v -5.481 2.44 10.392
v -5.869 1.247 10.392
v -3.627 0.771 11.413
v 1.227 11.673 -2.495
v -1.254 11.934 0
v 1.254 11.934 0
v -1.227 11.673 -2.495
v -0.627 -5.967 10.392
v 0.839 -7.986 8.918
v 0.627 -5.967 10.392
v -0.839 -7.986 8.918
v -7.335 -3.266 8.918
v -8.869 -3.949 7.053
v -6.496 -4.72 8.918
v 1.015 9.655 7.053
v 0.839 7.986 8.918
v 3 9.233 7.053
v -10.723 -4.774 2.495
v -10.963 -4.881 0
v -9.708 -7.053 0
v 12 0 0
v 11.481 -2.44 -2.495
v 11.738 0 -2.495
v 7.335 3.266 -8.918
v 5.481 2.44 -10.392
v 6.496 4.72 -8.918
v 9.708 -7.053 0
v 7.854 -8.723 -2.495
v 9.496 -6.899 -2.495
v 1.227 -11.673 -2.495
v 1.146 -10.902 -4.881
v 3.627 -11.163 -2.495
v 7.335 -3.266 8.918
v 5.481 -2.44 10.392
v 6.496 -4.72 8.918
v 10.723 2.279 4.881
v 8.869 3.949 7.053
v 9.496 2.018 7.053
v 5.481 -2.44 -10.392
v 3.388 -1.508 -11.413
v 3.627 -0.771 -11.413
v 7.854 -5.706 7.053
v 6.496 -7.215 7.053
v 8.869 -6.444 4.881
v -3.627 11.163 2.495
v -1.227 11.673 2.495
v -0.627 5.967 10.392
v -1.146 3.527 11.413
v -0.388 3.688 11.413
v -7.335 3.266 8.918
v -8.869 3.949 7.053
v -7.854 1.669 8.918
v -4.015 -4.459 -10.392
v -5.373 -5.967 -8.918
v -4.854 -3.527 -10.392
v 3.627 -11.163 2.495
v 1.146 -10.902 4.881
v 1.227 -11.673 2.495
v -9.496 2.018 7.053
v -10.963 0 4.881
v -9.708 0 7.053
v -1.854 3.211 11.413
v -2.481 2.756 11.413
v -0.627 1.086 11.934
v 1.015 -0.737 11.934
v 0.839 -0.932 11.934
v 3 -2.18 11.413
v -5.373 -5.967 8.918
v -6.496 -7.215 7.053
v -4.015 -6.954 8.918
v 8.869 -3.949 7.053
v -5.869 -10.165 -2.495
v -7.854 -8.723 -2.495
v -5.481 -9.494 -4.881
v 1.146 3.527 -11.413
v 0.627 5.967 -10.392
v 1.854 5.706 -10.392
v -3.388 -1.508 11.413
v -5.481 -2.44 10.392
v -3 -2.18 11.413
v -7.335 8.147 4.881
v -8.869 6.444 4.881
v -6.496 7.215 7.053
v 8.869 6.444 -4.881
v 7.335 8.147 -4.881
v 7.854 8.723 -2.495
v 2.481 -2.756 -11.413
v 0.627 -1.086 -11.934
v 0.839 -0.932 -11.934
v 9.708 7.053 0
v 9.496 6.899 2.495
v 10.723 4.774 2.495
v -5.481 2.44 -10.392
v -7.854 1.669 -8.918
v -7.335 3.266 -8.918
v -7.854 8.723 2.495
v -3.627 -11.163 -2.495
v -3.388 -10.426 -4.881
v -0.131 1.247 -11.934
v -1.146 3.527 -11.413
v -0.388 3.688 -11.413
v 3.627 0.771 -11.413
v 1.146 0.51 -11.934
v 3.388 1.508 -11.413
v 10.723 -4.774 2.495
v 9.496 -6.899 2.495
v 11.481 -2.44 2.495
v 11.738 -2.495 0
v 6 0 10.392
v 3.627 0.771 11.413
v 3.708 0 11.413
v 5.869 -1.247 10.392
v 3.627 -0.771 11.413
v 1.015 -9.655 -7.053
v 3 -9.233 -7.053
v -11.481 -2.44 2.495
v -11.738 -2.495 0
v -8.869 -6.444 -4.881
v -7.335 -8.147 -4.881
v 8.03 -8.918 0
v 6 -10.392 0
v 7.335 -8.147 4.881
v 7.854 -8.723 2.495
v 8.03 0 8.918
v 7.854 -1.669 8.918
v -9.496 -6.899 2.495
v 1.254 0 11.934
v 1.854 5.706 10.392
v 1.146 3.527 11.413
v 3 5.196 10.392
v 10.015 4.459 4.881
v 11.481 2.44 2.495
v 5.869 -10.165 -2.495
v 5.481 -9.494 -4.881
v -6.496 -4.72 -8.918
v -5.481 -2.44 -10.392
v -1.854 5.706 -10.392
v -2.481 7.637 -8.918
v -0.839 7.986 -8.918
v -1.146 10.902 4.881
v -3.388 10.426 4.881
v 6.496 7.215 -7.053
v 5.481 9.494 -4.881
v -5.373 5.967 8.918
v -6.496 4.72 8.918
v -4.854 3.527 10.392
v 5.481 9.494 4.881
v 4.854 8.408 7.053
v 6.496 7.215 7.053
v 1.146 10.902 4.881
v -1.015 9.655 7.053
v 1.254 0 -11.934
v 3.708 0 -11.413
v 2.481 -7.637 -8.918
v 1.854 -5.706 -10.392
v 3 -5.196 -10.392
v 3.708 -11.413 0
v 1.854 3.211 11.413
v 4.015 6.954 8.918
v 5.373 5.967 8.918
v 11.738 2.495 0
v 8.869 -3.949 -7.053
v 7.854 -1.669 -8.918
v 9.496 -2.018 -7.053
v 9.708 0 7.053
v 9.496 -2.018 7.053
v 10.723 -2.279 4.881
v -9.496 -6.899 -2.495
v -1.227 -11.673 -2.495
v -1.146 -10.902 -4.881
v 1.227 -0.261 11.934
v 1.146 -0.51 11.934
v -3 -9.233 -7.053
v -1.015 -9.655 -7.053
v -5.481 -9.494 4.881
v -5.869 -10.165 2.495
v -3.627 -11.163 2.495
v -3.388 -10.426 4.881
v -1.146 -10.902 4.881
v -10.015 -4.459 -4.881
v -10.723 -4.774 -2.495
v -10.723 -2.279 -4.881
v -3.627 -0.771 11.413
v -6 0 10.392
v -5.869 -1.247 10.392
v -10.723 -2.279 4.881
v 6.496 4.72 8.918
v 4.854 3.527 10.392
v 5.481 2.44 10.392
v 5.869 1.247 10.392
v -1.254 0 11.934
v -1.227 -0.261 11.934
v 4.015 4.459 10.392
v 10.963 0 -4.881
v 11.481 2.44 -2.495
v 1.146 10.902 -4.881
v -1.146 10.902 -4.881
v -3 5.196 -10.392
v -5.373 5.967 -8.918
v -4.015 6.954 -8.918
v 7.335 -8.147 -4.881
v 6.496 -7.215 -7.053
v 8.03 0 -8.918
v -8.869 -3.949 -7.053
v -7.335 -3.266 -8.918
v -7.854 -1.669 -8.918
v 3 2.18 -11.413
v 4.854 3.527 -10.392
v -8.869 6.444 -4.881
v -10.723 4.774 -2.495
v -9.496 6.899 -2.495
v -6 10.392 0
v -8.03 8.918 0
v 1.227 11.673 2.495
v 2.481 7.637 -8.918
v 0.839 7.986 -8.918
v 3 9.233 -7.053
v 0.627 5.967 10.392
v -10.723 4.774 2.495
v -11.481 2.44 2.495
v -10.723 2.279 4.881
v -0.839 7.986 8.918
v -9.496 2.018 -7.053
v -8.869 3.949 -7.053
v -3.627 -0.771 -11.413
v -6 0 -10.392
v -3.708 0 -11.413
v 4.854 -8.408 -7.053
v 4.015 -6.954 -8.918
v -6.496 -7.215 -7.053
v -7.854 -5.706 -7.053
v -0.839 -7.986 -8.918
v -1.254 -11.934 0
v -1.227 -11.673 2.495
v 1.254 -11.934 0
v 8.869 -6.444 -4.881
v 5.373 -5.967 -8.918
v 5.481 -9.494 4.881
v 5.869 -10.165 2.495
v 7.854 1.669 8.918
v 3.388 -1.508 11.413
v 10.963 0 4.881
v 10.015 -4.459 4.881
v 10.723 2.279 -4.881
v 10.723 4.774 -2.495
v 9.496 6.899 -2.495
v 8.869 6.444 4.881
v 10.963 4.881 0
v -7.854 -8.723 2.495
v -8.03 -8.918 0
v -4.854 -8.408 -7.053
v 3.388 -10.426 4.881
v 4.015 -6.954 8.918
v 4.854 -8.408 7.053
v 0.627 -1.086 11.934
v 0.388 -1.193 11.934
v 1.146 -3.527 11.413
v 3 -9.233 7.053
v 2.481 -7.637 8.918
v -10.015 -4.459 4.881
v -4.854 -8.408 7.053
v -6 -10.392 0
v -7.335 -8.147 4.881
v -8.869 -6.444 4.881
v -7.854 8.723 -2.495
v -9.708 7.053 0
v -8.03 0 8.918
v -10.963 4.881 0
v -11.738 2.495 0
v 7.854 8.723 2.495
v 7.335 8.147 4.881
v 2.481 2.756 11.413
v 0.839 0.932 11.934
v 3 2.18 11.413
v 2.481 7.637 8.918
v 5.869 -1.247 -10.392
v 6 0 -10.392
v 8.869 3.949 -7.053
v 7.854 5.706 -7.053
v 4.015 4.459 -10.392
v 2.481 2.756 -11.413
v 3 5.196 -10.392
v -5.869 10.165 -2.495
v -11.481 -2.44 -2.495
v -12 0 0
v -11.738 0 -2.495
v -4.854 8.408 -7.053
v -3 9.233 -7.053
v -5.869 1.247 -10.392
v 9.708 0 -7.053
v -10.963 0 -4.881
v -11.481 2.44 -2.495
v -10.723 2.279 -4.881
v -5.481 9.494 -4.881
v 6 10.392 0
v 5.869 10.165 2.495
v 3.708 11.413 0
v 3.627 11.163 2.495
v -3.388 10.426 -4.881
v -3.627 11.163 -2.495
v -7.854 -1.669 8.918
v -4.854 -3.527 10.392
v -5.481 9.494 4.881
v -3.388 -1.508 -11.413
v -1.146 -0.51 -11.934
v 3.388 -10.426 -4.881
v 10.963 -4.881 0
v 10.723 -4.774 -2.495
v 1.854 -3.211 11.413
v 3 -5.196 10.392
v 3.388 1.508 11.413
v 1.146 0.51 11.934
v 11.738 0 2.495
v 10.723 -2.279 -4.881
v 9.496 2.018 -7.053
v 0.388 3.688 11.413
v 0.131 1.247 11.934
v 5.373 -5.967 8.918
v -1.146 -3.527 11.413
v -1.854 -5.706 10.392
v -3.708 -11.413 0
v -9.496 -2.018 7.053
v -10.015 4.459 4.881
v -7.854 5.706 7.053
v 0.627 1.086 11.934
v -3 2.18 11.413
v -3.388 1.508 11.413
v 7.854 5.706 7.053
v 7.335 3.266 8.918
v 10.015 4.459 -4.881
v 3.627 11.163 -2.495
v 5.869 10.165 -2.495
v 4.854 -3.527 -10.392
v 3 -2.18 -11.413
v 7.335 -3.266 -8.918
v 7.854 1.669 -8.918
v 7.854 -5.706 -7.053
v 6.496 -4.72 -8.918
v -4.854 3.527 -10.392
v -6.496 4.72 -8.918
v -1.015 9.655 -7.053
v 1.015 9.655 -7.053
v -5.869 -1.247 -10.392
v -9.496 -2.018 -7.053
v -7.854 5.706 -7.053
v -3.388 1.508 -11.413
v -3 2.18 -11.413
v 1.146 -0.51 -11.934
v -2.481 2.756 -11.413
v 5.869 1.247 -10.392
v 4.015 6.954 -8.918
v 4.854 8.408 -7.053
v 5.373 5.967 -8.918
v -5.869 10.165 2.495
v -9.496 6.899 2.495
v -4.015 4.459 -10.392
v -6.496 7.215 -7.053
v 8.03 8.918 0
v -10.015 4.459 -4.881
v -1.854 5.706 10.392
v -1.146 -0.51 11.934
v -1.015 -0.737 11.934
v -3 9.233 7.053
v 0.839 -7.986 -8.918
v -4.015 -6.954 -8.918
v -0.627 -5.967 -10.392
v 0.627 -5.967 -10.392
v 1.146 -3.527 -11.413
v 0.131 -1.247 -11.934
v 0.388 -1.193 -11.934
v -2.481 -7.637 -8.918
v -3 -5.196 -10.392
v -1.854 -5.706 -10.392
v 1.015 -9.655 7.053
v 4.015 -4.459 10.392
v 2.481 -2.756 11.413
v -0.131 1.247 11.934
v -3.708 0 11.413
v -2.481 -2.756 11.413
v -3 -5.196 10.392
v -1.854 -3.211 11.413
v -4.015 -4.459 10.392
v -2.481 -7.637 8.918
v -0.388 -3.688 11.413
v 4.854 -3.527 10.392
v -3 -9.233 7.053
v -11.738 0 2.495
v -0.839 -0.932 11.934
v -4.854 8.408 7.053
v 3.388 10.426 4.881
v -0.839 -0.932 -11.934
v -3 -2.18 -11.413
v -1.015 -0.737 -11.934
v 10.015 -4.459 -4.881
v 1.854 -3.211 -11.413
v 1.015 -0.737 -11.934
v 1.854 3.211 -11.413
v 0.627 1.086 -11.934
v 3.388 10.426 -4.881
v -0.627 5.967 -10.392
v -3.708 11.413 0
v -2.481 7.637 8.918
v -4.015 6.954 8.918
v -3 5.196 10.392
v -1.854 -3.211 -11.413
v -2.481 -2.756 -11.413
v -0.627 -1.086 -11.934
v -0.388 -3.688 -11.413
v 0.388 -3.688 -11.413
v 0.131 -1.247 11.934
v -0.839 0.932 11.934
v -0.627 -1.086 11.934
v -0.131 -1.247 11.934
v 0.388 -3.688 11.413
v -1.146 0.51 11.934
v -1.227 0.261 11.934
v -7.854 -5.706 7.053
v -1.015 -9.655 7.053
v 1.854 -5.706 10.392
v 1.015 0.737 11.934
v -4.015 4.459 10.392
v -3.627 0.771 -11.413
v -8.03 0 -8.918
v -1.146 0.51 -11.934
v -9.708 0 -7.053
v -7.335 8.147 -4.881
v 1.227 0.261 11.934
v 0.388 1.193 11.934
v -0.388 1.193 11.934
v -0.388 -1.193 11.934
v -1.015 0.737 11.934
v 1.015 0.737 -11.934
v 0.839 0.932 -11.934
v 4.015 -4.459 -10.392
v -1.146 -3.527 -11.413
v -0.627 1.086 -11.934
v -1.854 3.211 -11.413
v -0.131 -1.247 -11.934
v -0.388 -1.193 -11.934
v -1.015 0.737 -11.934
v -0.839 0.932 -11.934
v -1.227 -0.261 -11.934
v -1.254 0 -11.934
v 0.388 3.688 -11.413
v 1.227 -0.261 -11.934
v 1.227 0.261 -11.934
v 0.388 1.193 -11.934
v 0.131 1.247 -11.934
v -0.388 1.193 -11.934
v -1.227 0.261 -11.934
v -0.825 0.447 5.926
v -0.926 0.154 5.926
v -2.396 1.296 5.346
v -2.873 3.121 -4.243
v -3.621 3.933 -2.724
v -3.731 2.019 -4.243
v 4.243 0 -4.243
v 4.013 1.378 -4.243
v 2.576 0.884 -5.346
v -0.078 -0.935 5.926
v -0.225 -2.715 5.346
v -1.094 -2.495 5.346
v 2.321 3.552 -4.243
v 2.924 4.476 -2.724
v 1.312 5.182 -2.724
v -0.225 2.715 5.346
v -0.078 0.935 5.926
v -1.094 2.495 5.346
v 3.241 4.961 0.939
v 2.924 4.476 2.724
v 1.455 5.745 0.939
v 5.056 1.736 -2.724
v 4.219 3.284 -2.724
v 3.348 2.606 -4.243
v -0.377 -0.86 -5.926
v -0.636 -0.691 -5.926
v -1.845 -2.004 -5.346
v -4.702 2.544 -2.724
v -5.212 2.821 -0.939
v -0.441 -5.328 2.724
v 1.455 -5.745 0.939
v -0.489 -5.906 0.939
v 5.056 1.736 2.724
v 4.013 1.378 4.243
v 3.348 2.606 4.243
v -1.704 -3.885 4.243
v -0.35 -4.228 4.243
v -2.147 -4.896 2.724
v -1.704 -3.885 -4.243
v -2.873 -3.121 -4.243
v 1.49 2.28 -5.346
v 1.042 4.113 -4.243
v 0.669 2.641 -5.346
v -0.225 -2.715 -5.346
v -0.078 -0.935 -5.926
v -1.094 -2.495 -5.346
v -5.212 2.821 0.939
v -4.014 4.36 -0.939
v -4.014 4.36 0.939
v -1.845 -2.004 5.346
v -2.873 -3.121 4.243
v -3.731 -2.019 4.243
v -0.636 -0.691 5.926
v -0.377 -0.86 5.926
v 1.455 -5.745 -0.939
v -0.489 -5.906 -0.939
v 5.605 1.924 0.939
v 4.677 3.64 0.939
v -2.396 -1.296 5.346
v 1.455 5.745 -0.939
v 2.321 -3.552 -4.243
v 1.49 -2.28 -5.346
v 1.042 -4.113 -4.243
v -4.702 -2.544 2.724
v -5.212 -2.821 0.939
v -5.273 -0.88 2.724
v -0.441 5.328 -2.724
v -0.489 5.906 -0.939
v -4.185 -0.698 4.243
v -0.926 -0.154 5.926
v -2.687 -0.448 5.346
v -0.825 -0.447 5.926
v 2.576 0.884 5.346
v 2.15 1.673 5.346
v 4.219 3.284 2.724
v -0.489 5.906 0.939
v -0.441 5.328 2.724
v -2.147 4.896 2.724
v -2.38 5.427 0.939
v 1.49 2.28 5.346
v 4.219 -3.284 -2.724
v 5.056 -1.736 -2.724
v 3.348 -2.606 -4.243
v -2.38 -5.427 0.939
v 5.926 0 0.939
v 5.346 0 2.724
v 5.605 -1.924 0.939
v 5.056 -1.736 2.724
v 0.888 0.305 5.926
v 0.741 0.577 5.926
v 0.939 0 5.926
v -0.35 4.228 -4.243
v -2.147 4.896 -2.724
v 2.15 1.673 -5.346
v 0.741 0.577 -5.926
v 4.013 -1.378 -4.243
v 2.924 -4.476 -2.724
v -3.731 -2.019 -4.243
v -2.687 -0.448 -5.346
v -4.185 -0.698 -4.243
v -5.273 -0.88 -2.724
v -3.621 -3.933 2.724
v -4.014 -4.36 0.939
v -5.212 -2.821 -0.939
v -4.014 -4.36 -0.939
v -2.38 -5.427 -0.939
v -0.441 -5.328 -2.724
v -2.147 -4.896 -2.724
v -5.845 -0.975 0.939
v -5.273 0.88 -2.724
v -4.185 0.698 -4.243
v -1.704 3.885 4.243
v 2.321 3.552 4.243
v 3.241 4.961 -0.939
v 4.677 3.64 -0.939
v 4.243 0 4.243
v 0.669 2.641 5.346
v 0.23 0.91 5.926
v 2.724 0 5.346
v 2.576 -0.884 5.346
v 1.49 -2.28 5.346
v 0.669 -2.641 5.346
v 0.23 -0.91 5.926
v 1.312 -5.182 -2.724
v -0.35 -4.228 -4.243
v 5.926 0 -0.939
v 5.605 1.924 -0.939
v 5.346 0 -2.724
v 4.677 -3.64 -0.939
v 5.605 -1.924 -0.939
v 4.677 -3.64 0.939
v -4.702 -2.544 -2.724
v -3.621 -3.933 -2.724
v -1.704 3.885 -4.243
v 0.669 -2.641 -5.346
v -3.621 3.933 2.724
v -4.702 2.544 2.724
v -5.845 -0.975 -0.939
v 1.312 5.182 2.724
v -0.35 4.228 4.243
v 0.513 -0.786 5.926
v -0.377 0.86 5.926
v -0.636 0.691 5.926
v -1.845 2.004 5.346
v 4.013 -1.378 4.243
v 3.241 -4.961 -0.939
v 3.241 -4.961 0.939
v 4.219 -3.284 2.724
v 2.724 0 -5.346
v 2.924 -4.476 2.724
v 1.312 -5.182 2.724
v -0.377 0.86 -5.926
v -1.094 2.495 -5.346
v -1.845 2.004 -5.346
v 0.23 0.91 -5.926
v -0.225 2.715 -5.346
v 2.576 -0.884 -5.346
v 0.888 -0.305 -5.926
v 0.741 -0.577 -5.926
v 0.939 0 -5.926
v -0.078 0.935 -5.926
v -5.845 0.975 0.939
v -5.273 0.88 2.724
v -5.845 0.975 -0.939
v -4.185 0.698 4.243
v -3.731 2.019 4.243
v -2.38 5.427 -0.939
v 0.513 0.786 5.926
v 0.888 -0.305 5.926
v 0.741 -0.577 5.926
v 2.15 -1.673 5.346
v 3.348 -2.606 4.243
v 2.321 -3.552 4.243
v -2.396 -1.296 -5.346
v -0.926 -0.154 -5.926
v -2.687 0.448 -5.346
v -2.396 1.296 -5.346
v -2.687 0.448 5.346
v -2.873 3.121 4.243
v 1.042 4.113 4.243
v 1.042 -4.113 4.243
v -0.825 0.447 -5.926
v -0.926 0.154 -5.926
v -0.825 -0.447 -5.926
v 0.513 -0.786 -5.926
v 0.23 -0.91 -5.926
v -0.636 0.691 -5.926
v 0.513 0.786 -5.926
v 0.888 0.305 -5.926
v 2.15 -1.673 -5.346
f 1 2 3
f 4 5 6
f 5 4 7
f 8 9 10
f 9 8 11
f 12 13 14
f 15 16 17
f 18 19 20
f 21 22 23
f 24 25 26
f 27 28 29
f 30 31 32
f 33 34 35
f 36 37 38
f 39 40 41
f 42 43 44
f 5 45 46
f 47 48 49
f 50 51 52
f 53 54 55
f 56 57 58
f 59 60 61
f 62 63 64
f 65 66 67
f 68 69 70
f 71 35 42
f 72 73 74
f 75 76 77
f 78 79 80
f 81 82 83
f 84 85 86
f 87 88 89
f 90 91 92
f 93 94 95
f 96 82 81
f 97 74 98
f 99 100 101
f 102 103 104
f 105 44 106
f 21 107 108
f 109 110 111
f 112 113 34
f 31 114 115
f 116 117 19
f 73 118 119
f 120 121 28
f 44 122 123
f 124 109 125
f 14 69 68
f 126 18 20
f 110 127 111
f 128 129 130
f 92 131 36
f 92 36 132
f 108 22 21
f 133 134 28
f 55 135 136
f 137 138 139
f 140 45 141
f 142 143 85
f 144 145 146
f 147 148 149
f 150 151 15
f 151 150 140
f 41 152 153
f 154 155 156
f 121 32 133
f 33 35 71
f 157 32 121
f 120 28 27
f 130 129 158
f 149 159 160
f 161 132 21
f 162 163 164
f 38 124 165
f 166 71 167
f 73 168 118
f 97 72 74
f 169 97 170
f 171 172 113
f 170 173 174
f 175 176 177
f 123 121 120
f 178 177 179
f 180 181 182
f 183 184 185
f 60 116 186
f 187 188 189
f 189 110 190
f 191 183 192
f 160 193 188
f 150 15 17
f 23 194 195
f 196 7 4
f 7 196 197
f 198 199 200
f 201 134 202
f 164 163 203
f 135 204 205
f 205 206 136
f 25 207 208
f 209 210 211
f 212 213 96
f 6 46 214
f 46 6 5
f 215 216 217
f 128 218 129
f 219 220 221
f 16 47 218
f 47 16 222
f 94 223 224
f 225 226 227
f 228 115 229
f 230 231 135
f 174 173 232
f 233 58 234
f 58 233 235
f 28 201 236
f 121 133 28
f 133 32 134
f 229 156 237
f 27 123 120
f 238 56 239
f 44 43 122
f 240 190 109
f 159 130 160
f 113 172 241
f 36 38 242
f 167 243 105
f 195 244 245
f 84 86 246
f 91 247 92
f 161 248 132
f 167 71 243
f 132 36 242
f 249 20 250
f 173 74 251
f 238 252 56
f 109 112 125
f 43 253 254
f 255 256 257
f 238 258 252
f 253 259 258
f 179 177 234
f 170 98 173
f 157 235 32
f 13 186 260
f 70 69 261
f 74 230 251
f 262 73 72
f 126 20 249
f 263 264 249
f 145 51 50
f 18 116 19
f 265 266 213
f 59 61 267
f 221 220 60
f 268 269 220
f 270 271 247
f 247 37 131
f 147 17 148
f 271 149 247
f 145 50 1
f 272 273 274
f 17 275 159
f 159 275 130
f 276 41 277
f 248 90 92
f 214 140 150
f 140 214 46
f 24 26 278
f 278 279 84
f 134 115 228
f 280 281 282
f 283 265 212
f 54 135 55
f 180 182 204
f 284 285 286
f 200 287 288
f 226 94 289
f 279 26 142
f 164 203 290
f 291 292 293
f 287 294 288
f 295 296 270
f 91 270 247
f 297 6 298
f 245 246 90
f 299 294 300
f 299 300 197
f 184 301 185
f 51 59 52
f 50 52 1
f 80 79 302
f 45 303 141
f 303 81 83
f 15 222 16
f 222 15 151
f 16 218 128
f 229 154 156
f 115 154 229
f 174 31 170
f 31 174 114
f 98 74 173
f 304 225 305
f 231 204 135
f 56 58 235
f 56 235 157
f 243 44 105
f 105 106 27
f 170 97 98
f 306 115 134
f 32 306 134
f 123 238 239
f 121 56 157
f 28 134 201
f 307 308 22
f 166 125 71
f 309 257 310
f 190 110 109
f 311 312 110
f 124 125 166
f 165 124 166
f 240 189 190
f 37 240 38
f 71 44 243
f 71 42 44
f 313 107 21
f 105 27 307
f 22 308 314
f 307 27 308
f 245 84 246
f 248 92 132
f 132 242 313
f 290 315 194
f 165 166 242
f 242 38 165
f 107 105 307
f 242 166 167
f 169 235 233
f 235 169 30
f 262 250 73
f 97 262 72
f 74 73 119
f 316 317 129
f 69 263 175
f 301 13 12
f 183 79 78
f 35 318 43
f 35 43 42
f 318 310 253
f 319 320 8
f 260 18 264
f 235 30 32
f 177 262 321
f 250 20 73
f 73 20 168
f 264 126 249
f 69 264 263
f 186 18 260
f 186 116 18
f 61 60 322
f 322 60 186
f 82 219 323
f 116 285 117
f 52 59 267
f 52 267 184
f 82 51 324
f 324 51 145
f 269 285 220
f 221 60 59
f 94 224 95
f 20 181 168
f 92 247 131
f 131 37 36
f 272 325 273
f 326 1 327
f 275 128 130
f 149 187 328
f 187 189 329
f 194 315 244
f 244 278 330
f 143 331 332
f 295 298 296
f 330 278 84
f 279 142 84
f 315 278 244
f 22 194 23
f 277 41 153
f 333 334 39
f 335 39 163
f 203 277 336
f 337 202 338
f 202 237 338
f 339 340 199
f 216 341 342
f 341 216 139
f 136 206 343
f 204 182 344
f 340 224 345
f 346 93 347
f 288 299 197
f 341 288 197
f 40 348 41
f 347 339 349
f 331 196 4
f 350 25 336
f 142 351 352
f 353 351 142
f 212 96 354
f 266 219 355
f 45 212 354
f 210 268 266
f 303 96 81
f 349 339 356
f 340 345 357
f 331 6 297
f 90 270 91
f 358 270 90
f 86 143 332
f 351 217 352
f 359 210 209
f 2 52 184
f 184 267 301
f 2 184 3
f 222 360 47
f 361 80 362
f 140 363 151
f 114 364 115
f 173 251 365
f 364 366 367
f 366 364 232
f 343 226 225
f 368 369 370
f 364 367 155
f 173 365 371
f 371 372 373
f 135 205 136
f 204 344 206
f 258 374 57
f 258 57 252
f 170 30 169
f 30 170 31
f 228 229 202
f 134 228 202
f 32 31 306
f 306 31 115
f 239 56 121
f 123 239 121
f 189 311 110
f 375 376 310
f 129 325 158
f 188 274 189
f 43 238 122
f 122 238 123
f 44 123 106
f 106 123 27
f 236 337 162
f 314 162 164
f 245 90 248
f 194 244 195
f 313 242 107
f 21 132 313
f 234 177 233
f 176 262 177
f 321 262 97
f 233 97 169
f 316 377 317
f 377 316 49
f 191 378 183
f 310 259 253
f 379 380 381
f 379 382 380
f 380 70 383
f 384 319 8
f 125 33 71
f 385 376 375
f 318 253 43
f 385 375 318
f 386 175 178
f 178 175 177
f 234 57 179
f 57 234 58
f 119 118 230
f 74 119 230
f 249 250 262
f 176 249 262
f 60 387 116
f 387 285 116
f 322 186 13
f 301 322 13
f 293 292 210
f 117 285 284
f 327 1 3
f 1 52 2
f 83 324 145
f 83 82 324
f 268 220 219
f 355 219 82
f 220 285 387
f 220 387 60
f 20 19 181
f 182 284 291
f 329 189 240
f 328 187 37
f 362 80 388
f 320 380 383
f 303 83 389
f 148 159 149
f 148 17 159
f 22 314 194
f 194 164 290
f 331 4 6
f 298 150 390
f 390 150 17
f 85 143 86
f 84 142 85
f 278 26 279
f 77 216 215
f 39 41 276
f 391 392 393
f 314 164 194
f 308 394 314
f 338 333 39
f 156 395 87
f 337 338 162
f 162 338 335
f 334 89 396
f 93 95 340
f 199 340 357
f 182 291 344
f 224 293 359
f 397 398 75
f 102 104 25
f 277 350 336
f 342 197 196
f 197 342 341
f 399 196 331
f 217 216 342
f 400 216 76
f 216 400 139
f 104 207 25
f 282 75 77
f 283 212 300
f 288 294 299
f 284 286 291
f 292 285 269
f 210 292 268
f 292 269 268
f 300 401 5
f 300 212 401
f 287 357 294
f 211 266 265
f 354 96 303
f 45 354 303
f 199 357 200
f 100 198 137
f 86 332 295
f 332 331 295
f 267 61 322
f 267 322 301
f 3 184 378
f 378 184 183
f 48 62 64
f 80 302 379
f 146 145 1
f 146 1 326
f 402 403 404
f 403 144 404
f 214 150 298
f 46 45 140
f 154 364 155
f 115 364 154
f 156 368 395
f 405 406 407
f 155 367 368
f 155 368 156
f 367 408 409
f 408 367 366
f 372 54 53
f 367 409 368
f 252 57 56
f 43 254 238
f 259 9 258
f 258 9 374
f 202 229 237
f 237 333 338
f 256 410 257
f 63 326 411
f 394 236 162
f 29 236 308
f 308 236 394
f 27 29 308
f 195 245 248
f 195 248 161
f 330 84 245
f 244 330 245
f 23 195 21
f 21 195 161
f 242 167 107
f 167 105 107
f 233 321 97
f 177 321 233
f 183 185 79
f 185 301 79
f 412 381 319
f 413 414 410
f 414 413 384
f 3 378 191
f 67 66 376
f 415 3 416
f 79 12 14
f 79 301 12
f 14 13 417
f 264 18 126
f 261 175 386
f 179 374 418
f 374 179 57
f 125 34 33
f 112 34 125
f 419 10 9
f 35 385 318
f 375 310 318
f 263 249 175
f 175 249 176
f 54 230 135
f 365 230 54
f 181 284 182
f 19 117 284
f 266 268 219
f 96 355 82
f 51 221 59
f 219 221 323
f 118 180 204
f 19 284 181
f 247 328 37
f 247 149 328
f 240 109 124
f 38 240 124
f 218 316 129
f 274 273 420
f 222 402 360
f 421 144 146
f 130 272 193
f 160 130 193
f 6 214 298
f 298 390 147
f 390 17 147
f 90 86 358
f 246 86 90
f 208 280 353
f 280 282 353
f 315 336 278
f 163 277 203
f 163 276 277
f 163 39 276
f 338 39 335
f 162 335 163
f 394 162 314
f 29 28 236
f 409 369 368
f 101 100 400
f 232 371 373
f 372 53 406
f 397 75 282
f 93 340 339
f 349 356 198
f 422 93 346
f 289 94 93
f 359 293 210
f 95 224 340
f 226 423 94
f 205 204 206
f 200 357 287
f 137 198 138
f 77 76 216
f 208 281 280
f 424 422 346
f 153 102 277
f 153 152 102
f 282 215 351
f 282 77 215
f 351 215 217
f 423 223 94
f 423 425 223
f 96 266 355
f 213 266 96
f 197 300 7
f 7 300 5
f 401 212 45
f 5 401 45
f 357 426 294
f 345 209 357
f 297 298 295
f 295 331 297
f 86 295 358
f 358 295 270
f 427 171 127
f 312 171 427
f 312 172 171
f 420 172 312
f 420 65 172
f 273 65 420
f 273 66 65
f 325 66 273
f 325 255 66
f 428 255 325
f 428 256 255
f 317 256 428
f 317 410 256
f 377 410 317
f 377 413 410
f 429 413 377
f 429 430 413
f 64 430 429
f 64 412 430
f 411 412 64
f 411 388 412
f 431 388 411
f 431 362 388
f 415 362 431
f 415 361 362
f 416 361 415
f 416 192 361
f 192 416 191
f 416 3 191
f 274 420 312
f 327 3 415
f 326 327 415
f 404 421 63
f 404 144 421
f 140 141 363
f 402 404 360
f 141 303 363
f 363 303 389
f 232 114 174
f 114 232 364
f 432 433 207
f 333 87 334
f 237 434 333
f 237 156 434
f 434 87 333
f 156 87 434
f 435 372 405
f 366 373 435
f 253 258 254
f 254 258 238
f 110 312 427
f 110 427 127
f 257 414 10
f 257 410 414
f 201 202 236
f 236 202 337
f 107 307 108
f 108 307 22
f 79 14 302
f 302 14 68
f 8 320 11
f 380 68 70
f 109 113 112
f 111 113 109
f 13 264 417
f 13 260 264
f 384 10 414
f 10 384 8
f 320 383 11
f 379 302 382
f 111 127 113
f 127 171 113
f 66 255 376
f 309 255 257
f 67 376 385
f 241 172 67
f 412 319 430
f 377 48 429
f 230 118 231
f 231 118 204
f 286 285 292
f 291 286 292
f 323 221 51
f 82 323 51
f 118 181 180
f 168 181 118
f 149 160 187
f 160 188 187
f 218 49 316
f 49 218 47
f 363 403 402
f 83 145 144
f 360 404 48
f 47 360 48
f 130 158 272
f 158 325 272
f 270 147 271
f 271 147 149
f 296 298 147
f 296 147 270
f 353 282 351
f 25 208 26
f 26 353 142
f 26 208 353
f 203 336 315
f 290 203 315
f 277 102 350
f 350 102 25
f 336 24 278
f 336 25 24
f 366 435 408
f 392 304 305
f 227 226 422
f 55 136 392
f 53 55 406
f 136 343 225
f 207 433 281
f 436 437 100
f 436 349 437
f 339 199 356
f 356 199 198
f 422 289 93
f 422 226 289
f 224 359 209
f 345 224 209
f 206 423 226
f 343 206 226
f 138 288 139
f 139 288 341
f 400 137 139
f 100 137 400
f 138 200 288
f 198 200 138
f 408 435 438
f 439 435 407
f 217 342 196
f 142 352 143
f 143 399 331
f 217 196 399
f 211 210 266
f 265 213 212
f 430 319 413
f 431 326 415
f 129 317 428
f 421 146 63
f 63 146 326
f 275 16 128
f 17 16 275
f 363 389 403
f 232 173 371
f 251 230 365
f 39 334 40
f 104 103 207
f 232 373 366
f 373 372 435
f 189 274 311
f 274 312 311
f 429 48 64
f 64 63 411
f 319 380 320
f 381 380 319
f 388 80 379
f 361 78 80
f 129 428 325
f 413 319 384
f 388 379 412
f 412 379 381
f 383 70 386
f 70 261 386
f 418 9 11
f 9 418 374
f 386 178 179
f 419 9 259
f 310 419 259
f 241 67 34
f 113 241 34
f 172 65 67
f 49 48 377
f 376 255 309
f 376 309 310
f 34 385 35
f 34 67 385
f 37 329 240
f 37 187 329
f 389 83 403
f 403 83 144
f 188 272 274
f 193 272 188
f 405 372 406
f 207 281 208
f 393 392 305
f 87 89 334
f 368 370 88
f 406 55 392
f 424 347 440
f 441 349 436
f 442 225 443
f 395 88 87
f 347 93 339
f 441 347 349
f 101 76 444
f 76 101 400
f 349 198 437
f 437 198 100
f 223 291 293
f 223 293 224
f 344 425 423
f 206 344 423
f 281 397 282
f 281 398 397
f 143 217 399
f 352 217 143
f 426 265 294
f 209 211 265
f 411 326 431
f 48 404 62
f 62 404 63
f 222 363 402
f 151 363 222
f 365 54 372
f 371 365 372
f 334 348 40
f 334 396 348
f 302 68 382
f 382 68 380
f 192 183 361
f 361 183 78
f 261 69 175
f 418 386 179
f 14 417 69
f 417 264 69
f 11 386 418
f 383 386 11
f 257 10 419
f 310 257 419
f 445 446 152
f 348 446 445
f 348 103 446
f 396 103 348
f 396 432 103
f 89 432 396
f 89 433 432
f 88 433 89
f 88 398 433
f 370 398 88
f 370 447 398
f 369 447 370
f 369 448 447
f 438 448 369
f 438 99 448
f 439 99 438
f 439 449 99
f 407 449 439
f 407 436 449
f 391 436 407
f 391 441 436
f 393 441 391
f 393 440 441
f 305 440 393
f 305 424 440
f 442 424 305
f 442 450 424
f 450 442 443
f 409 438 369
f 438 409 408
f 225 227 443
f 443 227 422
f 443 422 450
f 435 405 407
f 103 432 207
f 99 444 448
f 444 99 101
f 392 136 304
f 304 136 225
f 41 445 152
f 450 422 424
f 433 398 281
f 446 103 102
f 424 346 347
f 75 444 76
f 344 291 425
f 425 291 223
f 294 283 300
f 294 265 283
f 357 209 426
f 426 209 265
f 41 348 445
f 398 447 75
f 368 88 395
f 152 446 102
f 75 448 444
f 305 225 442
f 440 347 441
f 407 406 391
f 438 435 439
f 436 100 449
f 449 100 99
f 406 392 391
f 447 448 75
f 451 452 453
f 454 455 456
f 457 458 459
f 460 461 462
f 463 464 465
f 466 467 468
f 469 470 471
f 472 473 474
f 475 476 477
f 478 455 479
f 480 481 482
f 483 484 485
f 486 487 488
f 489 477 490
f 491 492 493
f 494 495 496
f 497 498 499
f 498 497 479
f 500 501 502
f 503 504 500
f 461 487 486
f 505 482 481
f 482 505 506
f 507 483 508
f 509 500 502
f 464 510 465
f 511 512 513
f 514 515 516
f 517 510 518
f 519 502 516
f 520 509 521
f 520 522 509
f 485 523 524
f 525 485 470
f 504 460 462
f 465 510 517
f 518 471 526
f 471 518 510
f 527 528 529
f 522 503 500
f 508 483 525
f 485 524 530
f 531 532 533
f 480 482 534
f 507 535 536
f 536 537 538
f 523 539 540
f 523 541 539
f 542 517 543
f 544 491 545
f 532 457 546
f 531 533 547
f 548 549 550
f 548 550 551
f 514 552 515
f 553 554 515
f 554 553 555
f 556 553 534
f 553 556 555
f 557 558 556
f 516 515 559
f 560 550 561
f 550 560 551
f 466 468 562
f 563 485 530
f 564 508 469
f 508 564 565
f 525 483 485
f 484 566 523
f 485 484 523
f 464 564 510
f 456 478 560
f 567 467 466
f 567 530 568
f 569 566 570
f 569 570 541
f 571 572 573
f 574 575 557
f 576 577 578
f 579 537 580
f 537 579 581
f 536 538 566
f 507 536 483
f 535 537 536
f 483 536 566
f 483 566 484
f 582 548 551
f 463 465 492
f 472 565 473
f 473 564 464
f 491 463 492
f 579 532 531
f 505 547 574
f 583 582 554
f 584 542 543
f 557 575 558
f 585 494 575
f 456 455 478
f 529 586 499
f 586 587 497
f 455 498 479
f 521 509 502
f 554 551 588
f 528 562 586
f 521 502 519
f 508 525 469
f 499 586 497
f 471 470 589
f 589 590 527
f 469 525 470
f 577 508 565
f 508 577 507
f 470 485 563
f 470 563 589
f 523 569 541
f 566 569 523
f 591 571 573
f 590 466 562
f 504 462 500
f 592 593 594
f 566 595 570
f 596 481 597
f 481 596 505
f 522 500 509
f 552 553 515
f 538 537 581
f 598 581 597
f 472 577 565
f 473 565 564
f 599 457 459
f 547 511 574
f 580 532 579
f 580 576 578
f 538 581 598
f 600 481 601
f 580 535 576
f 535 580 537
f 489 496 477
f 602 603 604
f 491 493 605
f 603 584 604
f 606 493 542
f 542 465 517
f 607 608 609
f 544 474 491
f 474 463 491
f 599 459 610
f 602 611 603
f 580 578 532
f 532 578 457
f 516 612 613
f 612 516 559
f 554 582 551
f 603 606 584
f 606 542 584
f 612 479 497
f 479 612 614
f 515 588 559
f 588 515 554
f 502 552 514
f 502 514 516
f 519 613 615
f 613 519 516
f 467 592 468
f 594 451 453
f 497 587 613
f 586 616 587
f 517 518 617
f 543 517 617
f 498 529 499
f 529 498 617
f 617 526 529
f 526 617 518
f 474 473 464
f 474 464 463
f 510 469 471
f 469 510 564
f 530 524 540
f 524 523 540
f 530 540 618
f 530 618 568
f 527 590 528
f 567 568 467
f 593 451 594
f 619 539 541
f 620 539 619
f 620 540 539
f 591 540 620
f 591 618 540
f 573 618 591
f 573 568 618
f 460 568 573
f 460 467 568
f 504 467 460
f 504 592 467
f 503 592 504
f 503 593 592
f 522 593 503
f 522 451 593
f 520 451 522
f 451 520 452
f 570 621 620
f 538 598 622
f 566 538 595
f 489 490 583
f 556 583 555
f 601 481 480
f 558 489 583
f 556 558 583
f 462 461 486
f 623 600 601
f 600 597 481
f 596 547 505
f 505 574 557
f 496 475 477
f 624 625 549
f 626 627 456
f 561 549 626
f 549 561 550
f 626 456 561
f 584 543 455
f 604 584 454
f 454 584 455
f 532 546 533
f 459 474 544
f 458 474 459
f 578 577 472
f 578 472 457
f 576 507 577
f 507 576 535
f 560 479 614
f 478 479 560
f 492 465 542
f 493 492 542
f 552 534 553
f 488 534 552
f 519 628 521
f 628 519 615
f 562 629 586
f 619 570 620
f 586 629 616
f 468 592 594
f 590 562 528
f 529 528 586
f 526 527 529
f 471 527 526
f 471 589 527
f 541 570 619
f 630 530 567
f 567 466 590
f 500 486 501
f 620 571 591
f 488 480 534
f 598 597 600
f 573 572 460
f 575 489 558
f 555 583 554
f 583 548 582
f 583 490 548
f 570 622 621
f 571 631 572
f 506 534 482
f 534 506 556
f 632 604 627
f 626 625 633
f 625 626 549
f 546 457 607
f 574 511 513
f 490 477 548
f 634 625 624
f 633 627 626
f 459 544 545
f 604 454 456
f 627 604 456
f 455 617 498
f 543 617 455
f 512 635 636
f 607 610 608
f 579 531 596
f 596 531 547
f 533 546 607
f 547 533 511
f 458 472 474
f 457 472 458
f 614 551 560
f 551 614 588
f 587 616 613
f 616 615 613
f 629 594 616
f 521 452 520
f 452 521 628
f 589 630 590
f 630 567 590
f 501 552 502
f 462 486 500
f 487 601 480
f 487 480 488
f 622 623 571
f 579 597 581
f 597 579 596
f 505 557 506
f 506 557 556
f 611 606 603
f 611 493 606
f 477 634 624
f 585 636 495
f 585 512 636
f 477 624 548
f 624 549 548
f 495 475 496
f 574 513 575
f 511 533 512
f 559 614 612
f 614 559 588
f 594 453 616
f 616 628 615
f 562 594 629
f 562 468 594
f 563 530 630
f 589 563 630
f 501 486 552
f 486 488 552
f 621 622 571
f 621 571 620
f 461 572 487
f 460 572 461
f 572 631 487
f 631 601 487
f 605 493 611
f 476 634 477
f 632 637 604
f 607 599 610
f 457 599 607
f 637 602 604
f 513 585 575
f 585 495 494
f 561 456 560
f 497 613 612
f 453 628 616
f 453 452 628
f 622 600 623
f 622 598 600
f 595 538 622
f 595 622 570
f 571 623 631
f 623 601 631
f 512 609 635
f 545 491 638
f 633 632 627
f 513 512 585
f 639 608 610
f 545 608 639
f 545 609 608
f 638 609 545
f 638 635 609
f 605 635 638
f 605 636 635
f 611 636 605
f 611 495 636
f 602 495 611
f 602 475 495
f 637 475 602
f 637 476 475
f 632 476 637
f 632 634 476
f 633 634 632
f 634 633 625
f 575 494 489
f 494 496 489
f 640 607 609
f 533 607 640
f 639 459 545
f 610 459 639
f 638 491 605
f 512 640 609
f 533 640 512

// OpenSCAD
// Generated by generate_scads.py
difference() {
  intersection() {
    sphere(r=12);
  }
  sphere(r=6);
}
